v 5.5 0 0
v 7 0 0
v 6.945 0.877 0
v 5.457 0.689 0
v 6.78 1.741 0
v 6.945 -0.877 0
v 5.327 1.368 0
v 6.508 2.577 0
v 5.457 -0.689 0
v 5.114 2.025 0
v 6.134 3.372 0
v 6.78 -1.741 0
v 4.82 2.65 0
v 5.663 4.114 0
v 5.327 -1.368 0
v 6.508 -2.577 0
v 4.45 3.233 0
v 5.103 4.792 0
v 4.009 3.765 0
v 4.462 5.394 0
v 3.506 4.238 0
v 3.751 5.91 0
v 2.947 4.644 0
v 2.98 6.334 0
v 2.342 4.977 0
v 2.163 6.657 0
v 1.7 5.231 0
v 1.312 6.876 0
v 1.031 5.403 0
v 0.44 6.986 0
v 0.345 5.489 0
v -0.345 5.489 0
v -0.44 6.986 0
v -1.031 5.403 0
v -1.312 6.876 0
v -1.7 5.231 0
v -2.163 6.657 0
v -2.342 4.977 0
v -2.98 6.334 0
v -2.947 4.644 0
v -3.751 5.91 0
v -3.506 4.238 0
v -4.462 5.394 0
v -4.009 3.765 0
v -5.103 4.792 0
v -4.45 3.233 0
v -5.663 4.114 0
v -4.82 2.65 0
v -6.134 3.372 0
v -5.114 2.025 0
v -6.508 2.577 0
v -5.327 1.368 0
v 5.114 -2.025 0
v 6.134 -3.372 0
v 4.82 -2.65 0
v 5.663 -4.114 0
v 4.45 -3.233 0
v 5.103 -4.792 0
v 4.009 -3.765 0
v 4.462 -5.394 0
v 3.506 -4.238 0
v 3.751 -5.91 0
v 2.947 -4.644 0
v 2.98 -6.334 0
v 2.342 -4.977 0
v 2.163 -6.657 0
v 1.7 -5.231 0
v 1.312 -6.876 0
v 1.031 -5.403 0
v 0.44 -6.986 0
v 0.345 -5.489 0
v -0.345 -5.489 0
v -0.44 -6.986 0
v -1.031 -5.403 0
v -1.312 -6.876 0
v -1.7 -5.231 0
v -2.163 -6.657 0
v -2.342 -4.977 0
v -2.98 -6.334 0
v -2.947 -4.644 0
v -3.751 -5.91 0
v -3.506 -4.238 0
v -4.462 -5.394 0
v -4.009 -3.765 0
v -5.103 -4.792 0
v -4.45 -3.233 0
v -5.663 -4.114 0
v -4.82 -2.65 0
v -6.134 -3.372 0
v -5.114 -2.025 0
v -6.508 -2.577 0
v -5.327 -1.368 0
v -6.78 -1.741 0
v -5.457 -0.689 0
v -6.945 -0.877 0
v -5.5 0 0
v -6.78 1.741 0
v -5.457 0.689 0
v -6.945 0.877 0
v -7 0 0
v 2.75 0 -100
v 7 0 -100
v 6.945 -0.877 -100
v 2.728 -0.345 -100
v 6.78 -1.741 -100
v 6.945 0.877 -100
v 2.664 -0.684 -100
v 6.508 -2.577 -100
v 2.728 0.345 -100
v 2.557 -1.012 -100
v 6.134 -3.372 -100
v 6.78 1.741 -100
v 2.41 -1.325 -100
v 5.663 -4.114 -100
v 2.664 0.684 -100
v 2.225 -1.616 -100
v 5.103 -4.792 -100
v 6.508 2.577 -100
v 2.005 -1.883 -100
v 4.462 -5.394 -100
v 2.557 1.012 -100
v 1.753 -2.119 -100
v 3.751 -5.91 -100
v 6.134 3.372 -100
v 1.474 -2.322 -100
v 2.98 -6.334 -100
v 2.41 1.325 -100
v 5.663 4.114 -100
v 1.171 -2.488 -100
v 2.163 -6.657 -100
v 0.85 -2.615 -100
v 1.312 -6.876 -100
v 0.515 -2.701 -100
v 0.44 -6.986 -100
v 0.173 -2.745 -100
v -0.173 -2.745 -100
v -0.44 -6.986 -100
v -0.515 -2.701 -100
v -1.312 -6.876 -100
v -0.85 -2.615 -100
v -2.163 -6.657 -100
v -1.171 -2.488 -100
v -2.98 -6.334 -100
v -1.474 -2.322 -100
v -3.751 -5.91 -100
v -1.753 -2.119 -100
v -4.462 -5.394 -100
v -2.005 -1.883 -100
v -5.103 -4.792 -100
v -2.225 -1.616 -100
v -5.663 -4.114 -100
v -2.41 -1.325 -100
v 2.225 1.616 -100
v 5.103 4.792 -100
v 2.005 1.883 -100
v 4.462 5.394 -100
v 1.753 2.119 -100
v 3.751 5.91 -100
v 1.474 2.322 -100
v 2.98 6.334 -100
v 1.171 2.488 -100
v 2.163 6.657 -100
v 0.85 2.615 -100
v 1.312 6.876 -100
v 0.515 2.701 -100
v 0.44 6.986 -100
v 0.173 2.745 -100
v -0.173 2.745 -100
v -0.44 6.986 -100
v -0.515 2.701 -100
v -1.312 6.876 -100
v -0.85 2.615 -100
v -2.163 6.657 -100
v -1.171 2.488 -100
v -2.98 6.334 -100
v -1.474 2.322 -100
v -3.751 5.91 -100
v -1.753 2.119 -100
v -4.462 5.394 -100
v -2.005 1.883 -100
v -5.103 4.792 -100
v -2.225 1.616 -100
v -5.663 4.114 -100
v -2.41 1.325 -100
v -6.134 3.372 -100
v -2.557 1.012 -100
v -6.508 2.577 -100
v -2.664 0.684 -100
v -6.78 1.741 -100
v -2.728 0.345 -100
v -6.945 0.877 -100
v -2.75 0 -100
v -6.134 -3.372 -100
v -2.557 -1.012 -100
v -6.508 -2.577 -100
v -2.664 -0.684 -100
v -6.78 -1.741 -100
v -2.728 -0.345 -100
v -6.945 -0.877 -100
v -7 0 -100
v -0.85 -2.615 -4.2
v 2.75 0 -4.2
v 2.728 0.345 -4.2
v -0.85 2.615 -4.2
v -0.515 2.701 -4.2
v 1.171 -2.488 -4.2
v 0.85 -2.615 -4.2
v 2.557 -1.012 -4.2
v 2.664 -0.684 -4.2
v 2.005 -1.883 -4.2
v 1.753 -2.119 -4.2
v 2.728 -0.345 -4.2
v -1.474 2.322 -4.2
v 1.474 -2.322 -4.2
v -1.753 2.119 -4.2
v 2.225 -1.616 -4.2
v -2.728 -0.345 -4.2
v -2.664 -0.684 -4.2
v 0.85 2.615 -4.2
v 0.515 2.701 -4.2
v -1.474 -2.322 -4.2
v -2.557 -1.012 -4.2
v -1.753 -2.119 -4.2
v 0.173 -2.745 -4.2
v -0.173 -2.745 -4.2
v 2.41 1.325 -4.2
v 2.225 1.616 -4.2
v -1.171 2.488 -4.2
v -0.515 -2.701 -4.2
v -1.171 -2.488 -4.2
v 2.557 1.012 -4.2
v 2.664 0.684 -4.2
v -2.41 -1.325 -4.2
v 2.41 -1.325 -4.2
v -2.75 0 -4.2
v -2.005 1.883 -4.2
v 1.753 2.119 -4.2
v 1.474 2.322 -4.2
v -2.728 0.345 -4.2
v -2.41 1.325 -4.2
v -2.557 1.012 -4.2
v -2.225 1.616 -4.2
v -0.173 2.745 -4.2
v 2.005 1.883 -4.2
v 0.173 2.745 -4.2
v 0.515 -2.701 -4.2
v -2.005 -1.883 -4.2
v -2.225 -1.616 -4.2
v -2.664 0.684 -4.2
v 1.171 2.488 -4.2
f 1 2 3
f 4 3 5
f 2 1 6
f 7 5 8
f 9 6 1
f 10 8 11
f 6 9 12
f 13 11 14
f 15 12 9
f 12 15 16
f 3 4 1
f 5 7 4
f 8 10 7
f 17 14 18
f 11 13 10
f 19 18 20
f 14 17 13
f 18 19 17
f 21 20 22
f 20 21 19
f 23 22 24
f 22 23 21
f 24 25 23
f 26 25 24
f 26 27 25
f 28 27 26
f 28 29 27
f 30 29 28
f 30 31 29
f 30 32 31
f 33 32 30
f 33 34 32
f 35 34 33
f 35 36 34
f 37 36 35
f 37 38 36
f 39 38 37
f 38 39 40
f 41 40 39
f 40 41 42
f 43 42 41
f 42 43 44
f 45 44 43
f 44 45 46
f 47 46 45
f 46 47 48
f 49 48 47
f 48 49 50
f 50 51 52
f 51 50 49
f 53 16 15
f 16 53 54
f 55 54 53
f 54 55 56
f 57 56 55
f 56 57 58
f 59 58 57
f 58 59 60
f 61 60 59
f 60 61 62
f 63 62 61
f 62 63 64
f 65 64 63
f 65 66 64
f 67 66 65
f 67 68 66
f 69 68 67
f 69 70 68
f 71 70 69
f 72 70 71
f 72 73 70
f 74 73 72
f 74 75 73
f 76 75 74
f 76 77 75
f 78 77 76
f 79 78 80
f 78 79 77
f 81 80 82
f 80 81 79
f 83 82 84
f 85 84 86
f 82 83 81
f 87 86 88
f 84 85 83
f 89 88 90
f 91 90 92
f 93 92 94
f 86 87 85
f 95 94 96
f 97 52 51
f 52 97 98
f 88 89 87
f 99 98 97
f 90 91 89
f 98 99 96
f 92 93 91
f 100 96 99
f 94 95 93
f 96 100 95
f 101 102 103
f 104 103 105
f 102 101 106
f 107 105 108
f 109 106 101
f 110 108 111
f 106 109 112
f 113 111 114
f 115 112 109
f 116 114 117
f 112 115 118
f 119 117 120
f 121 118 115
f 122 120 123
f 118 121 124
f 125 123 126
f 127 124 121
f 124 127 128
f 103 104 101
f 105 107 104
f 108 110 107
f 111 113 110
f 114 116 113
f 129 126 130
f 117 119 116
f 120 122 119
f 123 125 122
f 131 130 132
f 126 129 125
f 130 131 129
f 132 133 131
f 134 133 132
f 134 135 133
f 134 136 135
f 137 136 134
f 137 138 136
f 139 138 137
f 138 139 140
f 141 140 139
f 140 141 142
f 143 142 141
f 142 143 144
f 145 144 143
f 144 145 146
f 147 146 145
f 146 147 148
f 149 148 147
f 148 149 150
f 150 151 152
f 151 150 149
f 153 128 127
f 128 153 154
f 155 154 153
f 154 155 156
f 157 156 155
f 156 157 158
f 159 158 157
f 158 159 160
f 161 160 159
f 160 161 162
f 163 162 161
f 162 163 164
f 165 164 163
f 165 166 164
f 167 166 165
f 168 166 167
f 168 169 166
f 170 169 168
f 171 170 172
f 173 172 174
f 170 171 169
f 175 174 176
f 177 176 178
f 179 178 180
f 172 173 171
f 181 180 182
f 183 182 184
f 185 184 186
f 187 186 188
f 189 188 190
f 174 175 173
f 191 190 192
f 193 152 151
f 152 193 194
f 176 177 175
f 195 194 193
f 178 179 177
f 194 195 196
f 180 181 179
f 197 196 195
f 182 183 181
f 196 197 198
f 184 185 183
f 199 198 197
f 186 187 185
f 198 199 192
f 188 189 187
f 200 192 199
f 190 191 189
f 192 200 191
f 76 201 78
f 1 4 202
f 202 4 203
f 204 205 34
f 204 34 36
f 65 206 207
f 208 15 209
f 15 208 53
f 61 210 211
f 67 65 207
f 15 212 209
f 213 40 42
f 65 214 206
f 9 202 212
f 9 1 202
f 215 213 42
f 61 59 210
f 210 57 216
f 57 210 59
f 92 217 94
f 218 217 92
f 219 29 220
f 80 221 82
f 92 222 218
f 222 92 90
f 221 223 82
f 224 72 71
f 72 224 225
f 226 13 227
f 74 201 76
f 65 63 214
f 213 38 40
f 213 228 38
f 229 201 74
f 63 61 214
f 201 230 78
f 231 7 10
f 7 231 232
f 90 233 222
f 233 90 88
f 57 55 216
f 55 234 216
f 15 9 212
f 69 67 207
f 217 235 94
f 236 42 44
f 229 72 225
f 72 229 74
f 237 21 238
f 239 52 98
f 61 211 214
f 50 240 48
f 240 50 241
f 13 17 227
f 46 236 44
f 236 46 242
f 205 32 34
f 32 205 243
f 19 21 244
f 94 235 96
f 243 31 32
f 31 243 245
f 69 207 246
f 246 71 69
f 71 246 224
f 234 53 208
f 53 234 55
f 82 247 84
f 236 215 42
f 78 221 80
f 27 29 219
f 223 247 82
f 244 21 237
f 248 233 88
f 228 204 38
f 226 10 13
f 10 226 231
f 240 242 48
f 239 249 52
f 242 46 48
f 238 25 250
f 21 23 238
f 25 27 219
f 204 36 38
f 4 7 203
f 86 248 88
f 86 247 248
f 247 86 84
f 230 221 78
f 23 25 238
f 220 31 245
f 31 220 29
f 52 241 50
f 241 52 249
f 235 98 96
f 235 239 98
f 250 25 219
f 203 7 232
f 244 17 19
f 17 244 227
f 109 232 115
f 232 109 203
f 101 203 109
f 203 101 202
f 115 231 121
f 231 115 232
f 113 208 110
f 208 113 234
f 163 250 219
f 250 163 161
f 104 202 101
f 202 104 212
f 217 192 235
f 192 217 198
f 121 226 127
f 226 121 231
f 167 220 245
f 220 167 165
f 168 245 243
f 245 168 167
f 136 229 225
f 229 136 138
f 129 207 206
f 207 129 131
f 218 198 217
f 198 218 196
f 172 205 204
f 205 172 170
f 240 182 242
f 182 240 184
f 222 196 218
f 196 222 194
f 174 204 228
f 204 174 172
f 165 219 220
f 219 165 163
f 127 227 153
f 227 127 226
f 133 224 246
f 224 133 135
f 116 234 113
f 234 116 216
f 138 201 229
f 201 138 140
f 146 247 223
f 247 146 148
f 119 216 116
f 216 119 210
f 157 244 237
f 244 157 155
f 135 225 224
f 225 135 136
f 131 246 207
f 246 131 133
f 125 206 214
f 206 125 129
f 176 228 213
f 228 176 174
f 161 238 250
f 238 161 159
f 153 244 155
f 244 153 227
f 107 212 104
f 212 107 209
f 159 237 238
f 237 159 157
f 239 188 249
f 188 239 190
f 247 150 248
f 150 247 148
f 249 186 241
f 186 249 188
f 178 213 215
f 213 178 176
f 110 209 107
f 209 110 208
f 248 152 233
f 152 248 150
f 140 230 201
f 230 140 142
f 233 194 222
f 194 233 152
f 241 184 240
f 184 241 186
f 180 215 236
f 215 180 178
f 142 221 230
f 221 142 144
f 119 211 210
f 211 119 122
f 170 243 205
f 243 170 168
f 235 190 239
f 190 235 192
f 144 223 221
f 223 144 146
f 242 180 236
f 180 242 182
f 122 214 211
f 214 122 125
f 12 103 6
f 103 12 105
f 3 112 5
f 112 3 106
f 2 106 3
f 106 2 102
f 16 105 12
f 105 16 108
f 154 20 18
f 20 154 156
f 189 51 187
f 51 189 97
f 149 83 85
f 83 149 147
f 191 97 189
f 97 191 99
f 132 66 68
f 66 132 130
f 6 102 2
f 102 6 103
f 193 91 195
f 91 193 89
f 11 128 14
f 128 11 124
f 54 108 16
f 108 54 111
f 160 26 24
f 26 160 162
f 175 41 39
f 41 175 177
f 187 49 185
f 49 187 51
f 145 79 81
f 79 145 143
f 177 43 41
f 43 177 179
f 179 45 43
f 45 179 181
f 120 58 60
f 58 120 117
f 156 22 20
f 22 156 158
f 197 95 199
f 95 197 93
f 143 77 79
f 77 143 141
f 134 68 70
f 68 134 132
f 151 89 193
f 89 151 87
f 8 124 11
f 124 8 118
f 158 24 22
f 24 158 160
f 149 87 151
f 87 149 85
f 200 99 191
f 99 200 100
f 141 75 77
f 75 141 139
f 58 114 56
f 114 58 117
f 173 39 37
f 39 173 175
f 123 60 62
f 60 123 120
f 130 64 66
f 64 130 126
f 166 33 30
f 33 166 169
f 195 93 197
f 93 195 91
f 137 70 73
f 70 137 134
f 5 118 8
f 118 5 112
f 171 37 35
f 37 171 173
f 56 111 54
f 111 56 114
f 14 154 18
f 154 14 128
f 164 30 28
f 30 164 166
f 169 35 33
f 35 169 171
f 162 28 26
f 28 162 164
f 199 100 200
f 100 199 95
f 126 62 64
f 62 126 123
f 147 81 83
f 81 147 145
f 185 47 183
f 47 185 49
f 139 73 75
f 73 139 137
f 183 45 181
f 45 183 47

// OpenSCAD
$fn = 50;


difference() {
	union() {
		translate(v = [0, 0, -100.0000000000]) {
			cylinder(h = 100, r = 7.0000000000);
		}
		cylinder(h = 0, r = 17.0000000000);
	}
	union() {
		translate(v = [0, 0, 0]) {
			rotate(a = [0, 0, 0]) {
				difference() {
					union() {
						#translate(v = [0, 0, -100.0000000000]) {
							cylinder(h = 100, r = 2.2500000000);
						}
						#translate(v = [0, 0, -4.2000000000]) {
							cylinder(h = 4.2000000000, r = 7.0000000000, r1 = 2.7500000000, r2 = 5.5000000000);
						}
						#translate(v = [0, 0, -100.0000000000]) {
							cylinder(h = 100, r = 2.7500000000);
						}
						#translate(v = [0, 0, -100.0000000000]) {
							cylinder(h = 100, r = 2.2500000000);
						}
					}
					union();
				}
			}
		}
	}
}
